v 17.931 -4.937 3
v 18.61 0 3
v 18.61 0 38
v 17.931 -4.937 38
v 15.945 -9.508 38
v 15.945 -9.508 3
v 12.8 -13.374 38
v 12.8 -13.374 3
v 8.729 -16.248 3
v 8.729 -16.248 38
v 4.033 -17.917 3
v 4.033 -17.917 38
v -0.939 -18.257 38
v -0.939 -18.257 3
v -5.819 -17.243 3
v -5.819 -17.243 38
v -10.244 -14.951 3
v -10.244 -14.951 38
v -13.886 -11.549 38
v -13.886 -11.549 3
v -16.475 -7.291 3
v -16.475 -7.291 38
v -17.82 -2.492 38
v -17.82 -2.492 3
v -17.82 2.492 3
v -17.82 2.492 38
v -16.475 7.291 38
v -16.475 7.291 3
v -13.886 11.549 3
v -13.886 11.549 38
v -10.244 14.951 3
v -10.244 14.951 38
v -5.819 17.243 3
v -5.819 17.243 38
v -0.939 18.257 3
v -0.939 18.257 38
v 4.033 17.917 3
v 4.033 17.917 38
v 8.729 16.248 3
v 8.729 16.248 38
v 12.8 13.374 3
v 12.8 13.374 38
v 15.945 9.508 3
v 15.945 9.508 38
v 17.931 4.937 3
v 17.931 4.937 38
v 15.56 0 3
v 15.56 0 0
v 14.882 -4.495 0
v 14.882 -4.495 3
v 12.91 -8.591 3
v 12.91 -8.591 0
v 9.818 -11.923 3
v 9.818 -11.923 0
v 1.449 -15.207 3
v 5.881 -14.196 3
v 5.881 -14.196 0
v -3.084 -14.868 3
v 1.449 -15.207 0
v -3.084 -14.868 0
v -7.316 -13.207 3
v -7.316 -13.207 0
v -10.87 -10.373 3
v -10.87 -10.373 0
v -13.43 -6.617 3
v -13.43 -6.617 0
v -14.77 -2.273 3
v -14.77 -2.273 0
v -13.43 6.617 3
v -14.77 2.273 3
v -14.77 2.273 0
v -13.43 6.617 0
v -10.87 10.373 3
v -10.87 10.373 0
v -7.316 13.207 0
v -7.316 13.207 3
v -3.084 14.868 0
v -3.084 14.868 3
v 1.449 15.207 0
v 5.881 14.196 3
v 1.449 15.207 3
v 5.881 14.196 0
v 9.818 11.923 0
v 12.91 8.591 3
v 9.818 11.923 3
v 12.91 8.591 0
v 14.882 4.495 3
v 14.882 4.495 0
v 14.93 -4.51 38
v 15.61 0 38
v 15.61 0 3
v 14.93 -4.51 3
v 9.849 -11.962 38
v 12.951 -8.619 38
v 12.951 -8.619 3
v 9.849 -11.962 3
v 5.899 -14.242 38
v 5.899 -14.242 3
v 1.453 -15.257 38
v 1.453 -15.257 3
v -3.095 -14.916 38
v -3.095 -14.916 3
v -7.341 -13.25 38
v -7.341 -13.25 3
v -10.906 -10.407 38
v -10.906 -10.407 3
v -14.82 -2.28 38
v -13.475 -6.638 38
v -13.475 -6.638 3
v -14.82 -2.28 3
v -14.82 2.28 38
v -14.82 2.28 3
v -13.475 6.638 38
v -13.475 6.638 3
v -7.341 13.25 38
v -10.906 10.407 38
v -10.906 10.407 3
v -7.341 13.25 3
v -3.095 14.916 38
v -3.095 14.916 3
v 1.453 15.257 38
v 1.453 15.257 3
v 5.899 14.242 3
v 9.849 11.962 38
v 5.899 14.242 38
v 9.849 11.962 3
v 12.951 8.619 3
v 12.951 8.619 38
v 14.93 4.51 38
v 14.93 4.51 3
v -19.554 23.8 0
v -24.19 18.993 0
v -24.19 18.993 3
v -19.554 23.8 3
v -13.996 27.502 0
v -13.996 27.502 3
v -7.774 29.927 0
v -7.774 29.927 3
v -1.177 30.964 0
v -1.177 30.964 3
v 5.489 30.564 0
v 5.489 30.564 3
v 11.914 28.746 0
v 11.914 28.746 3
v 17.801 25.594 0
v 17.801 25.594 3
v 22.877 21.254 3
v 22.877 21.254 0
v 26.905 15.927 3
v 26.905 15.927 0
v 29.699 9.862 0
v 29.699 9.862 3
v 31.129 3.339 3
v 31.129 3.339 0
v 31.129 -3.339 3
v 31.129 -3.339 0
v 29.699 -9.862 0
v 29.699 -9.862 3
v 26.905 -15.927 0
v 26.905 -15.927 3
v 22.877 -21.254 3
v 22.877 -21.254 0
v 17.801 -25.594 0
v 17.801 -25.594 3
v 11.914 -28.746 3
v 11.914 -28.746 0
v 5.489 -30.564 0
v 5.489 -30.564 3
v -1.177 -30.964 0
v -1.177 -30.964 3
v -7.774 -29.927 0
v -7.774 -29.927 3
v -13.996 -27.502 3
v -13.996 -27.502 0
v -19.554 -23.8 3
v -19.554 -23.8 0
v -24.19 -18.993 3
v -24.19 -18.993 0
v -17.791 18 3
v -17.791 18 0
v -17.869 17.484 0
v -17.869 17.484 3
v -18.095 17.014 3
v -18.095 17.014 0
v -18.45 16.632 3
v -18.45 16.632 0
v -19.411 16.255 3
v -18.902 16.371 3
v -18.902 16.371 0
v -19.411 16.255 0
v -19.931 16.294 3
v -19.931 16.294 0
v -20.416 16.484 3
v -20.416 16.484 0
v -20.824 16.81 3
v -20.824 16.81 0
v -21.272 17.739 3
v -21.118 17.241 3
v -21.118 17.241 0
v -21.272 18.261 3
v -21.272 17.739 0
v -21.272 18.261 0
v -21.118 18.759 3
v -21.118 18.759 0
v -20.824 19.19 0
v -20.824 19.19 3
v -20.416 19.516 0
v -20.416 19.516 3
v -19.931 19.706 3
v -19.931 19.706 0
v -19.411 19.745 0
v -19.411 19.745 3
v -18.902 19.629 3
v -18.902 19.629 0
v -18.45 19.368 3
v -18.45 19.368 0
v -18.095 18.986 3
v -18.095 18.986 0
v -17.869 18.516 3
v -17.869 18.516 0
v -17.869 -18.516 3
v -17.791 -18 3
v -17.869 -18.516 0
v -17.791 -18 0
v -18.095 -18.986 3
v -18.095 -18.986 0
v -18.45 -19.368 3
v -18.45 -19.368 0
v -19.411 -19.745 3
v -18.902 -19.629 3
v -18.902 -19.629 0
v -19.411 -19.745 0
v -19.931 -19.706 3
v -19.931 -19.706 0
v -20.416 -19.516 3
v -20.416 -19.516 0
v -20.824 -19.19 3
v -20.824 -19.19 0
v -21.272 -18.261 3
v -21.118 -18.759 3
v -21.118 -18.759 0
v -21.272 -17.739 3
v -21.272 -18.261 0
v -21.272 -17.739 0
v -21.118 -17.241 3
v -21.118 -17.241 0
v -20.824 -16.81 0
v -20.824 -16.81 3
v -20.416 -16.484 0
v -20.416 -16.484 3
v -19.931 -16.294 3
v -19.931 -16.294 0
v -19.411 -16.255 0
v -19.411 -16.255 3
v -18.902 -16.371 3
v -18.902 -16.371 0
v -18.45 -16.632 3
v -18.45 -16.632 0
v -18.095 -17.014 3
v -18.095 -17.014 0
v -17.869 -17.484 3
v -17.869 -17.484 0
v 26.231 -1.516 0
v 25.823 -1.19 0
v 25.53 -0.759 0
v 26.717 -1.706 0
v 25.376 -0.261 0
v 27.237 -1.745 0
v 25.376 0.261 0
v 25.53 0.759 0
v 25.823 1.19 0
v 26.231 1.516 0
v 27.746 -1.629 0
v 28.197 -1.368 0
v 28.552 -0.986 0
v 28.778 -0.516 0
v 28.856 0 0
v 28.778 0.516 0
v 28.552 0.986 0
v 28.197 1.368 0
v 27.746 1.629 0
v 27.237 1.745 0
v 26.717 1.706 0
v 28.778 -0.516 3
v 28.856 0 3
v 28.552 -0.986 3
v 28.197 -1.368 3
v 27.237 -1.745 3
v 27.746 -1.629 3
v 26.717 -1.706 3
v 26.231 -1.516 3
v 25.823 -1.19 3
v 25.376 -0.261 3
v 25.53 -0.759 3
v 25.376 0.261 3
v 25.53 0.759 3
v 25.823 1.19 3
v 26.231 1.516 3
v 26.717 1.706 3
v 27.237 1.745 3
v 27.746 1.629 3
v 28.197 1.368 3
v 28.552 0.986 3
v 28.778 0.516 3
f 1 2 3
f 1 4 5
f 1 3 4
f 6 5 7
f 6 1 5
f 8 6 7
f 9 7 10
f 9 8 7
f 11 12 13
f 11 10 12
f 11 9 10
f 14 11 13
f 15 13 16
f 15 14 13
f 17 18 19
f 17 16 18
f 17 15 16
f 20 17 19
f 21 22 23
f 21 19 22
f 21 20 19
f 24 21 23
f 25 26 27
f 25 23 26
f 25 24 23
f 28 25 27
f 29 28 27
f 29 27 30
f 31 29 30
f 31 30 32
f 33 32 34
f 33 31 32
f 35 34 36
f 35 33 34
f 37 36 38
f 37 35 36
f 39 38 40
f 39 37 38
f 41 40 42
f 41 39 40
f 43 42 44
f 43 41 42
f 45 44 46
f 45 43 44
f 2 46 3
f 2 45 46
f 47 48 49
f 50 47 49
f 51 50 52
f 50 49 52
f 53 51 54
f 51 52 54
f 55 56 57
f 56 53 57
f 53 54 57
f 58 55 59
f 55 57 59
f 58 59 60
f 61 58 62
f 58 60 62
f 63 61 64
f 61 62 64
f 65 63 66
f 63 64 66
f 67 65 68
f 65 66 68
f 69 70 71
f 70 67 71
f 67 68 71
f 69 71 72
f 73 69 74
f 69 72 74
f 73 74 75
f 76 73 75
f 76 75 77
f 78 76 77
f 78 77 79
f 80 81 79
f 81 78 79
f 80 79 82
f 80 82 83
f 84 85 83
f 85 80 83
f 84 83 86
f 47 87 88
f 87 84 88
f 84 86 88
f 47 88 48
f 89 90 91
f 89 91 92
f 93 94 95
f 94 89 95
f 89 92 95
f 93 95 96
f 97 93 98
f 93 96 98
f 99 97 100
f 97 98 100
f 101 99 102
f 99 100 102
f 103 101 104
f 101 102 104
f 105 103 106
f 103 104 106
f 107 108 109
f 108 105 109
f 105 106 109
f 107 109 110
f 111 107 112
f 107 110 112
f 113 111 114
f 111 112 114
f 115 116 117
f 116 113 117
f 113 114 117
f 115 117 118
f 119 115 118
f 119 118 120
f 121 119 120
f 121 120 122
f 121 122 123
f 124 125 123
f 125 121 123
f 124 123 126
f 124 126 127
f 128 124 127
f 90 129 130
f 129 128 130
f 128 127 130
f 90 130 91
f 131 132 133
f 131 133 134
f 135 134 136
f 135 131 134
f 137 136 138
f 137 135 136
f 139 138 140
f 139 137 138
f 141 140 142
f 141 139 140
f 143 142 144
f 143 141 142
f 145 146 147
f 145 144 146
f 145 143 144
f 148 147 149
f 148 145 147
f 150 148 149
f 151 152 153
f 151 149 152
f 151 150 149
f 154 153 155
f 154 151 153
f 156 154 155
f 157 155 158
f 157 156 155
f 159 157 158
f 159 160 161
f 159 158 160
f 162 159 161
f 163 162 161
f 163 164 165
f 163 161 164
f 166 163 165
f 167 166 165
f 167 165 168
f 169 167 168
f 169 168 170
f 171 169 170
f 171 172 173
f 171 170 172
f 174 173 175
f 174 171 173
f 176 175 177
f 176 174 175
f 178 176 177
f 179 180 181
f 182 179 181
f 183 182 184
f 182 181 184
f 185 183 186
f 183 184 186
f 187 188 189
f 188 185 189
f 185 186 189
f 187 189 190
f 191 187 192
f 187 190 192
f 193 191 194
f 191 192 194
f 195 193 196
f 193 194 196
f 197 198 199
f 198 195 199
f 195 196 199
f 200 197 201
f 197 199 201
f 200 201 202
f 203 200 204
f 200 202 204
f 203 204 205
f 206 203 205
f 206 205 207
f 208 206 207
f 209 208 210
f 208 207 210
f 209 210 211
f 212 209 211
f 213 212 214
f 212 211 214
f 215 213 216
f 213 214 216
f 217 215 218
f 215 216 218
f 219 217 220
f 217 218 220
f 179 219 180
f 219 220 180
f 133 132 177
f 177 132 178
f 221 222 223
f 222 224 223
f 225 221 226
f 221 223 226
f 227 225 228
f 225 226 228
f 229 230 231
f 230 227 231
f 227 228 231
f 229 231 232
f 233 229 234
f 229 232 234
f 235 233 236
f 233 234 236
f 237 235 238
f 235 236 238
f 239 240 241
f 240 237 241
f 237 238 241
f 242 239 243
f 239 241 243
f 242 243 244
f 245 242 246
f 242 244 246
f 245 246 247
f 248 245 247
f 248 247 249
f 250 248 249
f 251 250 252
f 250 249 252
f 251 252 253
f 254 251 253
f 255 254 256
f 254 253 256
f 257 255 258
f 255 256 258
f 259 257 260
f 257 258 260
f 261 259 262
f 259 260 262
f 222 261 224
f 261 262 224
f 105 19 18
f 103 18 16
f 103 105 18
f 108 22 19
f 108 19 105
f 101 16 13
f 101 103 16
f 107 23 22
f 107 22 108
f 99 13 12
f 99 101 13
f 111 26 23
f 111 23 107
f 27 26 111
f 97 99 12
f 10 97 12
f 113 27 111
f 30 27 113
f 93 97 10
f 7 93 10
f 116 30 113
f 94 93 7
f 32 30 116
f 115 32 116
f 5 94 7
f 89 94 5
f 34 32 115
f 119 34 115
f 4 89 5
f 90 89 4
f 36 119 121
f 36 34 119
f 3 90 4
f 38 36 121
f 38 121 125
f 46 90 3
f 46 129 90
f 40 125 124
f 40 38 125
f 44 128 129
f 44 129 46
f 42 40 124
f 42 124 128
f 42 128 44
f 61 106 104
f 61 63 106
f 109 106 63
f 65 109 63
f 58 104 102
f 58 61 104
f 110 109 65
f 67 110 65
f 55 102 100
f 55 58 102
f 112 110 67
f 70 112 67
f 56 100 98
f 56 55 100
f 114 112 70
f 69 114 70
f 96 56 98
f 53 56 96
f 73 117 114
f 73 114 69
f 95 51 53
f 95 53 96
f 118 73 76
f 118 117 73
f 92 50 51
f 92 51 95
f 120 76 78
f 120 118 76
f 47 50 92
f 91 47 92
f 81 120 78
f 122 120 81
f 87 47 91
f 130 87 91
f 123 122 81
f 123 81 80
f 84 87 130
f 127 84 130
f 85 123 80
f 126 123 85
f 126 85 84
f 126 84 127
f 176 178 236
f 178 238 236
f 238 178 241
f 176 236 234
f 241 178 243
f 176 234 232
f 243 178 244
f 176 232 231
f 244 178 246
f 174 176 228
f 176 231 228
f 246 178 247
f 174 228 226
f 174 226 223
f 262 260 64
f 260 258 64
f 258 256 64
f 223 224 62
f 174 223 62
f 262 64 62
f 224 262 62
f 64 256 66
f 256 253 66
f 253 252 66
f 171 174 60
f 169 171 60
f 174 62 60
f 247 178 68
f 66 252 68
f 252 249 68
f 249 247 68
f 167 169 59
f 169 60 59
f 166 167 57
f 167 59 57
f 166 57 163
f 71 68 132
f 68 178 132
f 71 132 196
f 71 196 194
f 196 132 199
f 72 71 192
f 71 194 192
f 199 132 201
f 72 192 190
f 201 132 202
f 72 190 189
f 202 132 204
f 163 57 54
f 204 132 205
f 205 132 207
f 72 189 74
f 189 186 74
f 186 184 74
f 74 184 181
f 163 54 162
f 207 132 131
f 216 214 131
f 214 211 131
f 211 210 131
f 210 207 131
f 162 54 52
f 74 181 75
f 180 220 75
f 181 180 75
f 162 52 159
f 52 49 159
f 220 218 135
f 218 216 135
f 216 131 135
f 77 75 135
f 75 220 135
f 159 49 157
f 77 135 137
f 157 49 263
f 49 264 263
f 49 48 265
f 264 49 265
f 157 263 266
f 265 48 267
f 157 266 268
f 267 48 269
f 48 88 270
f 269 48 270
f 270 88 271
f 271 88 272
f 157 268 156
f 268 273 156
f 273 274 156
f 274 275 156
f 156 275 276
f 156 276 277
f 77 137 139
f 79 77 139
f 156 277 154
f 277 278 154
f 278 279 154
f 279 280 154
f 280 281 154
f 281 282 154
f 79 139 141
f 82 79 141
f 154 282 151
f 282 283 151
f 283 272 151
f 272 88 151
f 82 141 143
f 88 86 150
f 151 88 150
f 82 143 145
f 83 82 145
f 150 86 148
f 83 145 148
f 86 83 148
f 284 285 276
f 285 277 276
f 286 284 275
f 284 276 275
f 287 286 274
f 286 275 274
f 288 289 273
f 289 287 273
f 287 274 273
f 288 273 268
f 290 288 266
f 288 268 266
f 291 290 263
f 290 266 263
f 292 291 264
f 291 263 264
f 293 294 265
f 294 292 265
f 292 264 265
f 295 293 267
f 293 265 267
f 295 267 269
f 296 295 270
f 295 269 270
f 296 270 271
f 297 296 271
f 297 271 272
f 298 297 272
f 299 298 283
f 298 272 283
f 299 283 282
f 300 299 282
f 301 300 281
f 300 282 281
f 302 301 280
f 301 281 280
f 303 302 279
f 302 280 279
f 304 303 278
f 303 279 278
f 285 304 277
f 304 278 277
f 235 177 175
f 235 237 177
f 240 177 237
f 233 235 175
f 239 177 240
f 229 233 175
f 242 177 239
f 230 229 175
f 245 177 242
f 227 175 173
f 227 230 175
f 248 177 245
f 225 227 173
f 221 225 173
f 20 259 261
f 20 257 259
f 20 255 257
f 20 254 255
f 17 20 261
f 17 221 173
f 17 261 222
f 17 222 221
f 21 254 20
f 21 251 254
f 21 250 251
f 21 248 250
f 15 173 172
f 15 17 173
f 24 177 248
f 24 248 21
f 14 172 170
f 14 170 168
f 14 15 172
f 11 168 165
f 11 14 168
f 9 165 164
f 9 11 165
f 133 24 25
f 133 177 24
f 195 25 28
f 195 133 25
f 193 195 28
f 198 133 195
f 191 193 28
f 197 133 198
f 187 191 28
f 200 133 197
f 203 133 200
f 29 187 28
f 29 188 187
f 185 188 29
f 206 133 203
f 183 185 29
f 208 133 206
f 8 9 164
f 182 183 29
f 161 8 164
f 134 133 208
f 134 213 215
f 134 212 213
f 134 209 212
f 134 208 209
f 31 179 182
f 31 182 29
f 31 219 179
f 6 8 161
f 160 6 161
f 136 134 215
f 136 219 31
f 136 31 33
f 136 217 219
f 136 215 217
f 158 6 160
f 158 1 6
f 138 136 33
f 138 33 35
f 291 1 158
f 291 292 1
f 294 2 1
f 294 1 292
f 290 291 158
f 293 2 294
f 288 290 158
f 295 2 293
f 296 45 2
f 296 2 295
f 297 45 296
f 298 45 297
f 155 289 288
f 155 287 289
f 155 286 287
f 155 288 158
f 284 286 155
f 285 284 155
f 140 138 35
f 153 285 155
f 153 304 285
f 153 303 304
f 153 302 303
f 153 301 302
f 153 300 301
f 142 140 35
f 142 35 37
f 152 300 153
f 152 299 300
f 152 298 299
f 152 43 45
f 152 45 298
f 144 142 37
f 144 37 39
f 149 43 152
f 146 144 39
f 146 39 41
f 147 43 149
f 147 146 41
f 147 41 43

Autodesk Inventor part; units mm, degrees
ref_plane "YZ Plane" through (0, 0, 0) normal (1, 0, 0) x (0, 1, 0)
ref_plane "XZ Plane" through (0, 0, 0) normal (0, 1, 0) x (-1, 0, 0)
ref_plane "XY Plane" through (0, 0, 0) normal (0, 0, 1) x (1, 0, 0)
ref_plane "Work Plane1" through (0, 0, 0) normal (0, 0, 1) x (1, 0, 0)
sketch "Sketch1" plane through (0, 0, 0) normal (0, 0, 1) x (1, 0, 0)
  circle A0 centre (27.1062, 0) radius 1.75 construction
  circle A1 centre (-19.5414, -18) radius 1.75 construction
  circle A2 centre (-19.5414, 18) radius 1.75 construction
  arc A3 (-24.1905, -18.9934) -> (-24.1905, 18.9934) centre (0.3095, 0) ccw projected
  circle A4 centre (0.3095, 0) radius 15.25 projected
  circle A5 centre (-19.5414, 18) radius 1.75 projected
  circle A6 centre (-19.5414, -18) radius 1.75 projected
  circle A7 centre (27.1062, 0) radius 1.75 projected
  line L0 (-24.1905, 18.9934) -> (-24.1905, -18.9934) projected
  arc A8 (-24.1905, -18.9934) -> (-24.1905, 18.9934) centre (0.3095, 0) ccw projected
  circle A9 centre (0.3095, 0) radius 15.25
  point P0 (0, 0)
extrude "Extrusion1" add sketch "Sketch1" along normal blind 3
sketch "Sketch2" plane through (0, 0, 3) normal (0, 0, 1) x (1, 0, 0)
  circle A0 centre (0.3095, 0) radius 15.25 projected
  circle A1 centre (0.3095, 0) radius 15.3
  circle A2 centre (0.3095, 0) radius 18.3
  point P0 (0, 0)
  dimension "d2" = 30.6
  dimension "d3" = 3
extrude "Extrusion2" add sketch "Sketch2" along normal blind 35 contours A2
properties part number "10_Zeiss_Axiotech_Eypiecemount_Adapter"
